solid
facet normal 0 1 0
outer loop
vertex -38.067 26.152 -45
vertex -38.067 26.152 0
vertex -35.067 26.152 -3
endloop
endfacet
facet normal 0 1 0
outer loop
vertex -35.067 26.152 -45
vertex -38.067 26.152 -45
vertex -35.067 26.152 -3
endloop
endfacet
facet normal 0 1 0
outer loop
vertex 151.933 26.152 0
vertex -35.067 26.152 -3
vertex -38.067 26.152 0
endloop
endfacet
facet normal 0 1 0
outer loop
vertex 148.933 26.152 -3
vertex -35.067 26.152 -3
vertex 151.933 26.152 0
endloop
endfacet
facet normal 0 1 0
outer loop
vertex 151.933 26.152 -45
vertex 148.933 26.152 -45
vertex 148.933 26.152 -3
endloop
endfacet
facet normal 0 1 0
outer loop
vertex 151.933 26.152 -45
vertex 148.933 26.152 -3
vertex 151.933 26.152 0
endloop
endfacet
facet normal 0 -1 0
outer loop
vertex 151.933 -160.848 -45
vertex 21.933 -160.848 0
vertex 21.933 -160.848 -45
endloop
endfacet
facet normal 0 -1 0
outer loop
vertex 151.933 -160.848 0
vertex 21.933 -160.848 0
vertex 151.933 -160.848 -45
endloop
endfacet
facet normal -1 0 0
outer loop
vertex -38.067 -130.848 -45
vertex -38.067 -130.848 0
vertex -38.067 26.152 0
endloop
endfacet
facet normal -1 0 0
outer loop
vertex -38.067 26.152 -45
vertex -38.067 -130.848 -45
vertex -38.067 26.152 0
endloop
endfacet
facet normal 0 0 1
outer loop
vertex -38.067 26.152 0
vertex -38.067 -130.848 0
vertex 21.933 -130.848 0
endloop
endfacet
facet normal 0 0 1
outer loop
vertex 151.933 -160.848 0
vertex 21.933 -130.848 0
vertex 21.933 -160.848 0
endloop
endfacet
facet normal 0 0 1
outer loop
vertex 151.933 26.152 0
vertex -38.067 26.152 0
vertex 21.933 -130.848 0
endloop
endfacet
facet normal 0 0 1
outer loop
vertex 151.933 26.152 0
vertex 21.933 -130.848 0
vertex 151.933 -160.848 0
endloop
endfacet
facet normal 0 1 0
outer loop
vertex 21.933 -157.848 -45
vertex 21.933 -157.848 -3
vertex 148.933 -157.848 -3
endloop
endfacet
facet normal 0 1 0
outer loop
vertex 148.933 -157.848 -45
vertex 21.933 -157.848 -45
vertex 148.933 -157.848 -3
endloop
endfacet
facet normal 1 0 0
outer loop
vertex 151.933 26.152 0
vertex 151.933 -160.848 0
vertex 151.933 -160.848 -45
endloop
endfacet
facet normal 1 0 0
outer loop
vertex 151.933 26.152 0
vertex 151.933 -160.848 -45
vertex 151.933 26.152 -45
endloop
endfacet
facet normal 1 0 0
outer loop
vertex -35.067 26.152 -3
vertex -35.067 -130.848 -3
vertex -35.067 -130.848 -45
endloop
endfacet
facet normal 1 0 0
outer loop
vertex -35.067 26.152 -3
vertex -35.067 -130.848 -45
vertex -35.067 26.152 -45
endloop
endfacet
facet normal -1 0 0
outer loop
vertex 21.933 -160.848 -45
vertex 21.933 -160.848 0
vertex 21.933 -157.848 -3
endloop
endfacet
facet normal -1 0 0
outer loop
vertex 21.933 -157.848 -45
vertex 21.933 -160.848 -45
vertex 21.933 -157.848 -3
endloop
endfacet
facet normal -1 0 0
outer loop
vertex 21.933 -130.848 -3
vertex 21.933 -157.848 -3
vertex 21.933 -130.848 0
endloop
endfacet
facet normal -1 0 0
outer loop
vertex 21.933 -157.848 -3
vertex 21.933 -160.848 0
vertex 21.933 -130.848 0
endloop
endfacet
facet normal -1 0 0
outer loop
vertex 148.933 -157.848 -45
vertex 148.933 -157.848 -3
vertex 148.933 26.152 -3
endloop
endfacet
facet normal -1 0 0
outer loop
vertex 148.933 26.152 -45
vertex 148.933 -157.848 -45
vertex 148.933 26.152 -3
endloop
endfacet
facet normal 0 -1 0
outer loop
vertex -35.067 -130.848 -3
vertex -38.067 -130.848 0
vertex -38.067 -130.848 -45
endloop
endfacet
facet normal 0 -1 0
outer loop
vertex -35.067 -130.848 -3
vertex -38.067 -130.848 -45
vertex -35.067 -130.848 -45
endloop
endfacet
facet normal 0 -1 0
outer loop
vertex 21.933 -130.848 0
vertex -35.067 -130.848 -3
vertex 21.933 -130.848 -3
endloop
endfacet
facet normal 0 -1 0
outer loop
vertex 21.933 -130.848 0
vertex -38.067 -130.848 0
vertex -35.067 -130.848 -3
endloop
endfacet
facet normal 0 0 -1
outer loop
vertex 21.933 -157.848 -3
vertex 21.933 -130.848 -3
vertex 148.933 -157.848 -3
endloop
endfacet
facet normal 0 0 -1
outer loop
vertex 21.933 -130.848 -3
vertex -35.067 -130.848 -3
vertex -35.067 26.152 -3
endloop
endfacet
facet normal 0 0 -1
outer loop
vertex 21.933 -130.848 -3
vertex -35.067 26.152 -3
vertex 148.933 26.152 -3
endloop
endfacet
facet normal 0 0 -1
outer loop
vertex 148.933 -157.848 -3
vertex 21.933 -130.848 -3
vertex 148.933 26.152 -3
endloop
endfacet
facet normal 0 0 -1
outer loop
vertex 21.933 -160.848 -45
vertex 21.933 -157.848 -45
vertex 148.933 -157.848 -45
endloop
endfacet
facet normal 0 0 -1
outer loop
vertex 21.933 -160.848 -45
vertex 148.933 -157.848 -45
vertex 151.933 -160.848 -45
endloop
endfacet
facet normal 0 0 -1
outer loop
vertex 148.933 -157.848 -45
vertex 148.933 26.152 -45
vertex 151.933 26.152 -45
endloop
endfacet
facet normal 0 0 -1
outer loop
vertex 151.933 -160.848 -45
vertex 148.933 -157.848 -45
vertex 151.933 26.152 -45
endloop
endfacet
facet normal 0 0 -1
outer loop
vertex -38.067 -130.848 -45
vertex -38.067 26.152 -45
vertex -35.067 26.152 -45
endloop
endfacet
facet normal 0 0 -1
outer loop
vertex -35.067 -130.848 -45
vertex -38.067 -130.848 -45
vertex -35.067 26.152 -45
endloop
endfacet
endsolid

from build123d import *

# Parameters (mm, degrees)
CROQUIS1_W              = 190
CROQUIS1_H              = 190
SALIENTE_EXTRUIR1_DEPTH = 45
VACIADO1_T              = -3
CROQUIS4_W              = 60
CROQUIS4_H              = 30
CORTAR_EXTRUIR1_DEPTH   = 226.78881097
CROQUIS7_W              = 190
CROQUIS7_H              = 45
CORTAR_EXTRUIR2_DEPTH   = 3


with BuildPart() as part:
    # Croquis1 → Saliente-Extruir1 (new body)
    with BuildSketch(Plane.XY):
        with Locations((56.932555838, -65.848020305)):
            Rectangle(CROQUIS1_W, CROQUIS1_H)
    extrude(amount=-SALIENTE_EXTRUIR1_DEPTH)

    # Vaciado1
    vaciado1_openings = [part.faces().sort_by_distance(p)[0] for p in [
        (56.932555838, -65.848020305, -45),
    ]]
    offset(amount=VACIADO1_T, openings=vaciado1_openings, kind=Kind.INTERSECTION)

    # Croquis4 → Cortar-Extruir1 (cut, through all)
    with BuildSketch(Plane.XY):
        with Locations((-8.067444162, -145.848020305)):
            Rectangle(CROQUIS4_W, CROQUIS4_H)
    extrude(amount=-CORTAR_EXTRUIR1_DEPTH, mode=Mode.SUBTRACT)

    # Croquis7 → Cortar-Extruir2 (cut)
    with BuildSketch(Plane(origin=(0, 29.151979695, 0), x_dir=(1, 0, 0), z_dir=(0, 1, 0))):
        with Locations((56.932555838, 22.5)):
            Rectangle(CROQUIS7_W, CROQUIS7_H)
    extrude(amount=-CORTAR_EXTRUIR2_DEPTH, mode=Mode.SUBTRACT)


solid = part.part
